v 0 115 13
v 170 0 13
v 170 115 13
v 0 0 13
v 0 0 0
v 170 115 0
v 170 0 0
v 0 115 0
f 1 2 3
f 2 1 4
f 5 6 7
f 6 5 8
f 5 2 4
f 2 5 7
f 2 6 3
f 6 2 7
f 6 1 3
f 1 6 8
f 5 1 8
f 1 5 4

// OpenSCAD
// file: params.scad
// Case dimensions from build guide
// Overall envelope
case_w = 170;   // width  (mm) — display width + margins
case_h = 115;   // height (mm) — display height + margins
case_d = 26;    // depth  (mm) — uniform front-to-back

// Display cutout (front face)
display_w = 163; // display opening width  (mm)
display_h = 98;  // display opening height (mm)

// Cavity depths (back half)
battery_depth    = 6;   // battery cavity depth  (mm)
electronics_depth = 22; // electronics cavity depth (mm)

// Derived: wall thickness — raw expression gives -1mm with current dimensions
// (26 - 6 - 22) / 2 = -1; clamped to min_wall. Increase case_d for real geometry.
min_wall = 1;
wall = max(min_wall, (case_d - battery_depth - electronics_depth) / 2);
// main file
// Front piece — display bezel with cutout
// TODO: implement display cutout geometry
include <params.scad>

module front() {
    // Stub: solid front slab
    cube([case_w, case_h, case_d / 2]);
}

front();
